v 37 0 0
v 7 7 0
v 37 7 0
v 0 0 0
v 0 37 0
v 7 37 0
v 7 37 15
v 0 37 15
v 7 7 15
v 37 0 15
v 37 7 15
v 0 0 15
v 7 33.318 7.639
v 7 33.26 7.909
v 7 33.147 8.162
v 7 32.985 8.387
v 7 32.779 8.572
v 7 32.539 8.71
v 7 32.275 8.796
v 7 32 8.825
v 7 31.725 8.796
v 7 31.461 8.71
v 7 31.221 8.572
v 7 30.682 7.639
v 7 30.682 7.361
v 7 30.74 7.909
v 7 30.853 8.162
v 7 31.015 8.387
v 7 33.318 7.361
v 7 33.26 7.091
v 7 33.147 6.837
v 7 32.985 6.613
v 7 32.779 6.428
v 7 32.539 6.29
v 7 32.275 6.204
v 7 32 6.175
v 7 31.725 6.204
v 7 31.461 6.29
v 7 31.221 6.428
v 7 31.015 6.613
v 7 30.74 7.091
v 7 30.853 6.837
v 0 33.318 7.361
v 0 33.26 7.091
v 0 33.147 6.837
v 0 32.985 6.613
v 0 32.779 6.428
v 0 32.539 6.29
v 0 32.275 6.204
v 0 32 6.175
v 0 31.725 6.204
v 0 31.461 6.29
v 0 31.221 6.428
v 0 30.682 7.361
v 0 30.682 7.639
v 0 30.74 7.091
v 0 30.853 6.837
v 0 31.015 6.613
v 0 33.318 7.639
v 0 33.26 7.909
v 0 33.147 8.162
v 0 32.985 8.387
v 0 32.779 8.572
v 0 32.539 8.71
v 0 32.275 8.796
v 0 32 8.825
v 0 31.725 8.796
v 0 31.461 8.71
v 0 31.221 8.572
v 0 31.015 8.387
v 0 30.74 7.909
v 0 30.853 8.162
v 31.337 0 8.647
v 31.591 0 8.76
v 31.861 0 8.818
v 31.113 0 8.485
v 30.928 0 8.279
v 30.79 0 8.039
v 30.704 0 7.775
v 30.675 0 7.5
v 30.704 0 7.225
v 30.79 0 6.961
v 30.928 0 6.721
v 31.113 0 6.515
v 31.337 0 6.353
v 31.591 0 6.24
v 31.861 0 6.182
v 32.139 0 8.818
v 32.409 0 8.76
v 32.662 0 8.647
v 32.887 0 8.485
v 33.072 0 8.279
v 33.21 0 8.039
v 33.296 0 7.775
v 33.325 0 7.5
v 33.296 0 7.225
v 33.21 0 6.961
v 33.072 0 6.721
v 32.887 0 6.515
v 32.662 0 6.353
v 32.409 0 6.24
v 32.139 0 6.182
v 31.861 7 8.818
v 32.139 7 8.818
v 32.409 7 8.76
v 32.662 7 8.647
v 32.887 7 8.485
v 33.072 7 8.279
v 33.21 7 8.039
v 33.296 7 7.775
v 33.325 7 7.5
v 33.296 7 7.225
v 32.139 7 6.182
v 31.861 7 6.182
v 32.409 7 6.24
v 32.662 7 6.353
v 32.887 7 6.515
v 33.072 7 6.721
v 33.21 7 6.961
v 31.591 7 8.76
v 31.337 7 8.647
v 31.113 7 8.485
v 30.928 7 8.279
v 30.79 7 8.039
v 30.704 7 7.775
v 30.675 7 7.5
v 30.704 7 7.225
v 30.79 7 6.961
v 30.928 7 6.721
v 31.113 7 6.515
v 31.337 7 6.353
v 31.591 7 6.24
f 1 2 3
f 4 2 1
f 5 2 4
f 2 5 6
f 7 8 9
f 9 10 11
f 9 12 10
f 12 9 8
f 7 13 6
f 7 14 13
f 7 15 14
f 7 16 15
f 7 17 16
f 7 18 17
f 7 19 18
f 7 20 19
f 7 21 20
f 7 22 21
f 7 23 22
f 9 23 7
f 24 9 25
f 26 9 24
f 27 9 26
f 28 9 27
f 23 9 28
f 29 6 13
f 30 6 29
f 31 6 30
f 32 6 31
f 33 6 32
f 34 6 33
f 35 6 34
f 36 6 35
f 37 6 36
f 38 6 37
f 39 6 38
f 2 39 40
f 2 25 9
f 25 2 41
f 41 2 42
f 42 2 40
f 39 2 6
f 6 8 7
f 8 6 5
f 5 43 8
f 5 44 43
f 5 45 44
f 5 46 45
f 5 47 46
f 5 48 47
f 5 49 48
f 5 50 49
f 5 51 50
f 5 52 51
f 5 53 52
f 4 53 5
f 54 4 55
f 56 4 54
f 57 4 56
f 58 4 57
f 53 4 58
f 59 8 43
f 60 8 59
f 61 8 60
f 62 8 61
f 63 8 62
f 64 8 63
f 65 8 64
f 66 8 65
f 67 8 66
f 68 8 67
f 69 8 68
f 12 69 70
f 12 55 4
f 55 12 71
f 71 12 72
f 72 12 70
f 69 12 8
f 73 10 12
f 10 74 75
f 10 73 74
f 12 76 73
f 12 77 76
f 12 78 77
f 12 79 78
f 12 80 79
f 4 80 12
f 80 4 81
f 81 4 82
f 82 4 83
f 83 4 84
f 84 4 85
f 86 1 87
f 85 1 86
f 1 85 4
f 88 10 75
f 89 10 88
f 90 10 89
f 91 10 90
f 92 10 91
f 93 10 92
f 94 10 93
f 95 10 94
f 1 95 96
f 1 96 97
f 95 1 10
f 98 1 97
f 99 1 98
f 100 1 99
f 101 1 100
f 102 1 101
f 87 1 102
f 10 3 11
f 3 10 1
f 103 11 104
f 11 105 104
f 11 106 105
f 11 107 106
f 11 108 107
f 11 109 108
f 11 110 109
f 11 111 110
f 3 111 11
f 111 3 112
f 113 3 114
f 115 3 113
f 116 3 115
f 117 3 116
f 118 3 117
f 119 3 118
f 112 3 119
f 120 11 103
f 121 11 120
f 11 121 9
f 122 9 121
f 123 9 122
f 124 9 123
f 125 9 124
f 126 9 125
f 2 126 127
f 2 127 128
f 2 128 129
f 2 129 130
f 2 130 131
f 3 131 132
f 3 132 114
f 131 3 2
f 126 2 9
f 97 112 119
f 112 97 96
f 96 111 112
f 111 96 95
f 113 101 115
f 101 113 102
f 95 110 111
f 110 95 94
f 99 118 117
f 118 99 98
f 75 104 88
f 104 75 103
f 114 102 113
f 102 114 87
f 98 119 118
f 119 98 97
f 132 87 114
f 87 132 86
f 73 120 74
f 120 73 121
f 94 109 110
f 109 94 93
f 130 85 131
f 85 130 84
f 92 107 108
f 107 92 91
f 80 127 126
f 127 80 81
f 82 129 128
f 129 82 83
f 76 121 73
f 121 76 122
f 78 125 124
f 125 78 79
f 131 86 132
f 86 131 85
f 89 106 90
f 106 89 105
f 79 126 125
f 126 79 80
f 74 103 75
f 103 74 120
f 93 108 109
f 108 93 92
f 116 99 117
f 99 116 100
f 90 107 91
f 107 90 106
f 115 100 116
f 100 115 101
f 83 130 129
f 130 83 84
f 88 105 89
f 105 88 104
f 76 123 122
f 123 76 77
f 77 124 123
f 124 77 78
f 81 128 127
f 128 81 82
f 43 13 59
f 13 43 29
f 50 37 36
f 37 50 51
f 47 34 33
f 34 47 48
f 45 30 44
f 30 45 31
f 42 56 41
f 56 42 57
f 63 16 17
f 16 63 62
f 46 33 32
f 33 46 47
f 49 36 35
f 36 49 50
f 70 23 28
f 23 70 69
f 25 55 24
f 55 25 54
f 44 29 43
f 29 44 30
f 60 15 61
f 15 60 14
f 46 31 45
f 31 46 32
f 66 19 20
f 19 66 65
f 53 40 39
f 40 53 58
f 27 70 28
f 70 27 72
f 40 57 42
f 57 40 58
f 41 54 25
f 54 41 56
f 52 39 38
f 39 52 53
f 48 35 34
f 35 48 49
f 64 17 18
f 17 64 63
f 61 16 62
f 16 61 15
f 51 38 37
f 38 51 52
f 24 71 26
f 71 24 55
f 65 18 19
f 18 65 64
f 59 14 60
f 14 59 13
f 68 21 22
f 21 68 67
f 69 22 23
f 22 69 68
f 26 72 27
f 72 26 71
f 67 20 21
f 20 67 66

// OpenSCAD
clamp_l = 30;
clamp_w = 15;
clamp_t = 7;

thread_od = 2.65;//2.83
thread_pos = clamp_l + clamp_t -5 ;
$fn =30;

difference(){
linear_extrude(clamp_w )difference(){
    difference(){
        square(clamp_l+clamp_t);
        translate([clamp_t,clamp_t])square(clamp_l);
    }


}


{
#translate([thread_pos, 0,clamp_w/2])rotate([-90,0,0])#cylinder(d = thread_od, h = clamp_t);
translate([ 0,thread_pos,clamp_w/2])rotate([0,90,0])#cylinder(d = thread_od, h = clamp_t);
}
}
